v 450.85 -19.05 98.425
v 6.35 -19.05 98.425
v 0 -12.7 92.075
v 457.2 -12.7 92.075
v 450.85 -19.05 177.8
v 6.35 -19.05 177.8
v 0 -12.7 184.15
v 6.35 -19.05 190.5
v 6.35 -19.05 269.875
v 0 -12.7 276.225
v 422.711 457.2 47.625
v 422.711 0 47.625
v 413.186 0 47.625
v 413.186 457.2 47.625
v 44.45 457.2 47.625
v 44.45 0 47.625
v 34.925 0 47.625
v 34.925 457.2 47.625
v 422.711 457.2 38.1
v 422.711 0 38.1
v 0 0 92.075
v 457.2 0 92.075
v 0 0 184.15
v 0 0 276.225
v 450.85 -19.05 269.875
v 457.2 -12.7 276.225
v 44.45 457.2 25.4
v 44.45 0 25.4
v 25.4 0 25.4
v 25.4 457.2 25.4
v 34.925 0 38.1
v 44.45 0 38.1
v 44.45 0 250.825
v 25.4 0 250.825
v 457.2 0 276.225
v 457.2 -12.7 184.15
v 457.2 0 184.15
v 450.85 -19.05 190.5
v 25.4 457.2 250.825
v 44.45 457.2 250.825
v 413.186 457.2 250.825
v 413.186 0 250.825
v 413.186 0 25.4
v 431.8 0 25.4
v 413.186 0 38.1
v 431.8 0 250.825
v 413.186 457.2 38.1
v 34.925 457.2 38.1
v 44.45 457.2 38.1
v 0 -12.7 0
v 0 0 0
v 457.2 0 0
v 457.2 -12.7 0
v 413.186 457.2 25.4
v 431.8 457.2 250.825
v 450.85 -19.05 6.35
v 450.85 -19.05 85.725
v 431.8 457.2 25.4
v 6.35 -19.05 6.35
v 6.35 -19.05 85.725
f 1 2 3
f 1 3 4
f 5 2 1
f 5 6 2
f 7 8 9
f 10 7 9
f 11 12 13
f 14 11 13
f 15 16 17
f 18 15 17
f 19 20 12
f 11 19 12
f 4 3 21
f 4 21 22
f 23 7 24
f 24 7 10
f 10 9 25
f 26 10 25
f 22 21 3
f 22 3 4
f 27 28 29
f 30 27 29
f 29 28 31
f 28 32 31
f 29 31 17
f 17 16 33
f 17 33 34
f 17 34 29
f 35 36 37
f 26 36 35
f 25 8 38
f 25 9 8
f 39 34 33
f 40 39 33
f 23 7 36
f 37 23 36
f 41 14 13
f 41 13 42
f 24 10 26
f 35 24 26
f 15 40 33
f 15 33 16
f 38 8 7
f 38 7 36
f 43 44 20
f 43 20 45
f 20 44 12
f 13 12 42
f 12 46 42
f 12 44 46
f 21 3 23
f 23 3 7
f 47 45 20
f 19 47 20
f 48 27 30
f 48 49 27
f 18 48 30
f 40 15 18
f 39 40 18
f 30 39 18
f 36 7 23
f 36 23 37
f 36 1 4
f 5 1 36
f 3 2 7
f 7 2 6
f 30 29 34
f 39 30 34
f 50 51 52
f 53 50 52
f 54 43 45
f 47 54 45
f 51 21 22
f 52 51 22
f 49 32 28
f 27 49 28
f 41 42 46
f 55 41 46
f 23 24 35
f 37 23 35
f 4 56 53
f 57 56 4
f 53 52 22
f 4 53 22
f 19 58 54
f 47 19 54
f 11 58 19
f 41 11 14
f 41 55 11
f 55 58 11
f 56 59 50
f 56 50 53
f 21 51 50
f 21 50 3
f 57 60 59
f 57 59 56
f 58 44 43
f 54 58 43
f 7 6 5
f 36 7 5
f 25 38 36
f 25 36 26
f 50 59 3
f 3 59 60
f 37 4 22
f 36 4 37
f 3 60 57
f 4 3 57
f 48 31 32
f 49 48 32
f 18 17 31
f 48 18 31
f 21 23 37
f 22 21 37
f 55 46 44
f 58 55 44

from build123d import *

# Parameters (mm, degrees)
F0_W      = 457.2
F0_H      = 92.075
F1_DEPTH  = 19.05
F2_W      = 457.2
F2_H      = 92.075
F3_DEPTH  = 19.05
F4_W      = 457.2
F4_H      = 92.075
F5_DEPTH  = 19.05
F6_SIZE   = 6.35
F7_SIZE   = 6.35
F8_SIZE   = 6.35
F10_DEPTH = 457.2


with BuildPart() as f1:
    # F0 (on Front) → F1 (new body)
    with BuildSketch(Plane.XZ):
        with Locations((228.6, 46.0375)):
            Rectangle(F0_W, F0_H)
    extrude(amount=F1_DEPTH)

    # F6
    f6_edges = [f1.edges().sort_by_distance(p)[0] for p in [
        (228.6, -19.05, 92.075),
        (228.6, -19.05, 0),
        (457.2, -19.05, 46.0375),
        (0, -19.05, 46.0375),
    ]]
    chamfer(f6_edges, length=F6_SIZE)


with BuildPart() as f3:
    # F2 (on face) → F3 (new body)
    with BuildSketch(Plane.XZ.offset(19.05)):
        with Locations((228.6, 138.1125)):
            Rectangle(F2_W, F2_H)
    extrude(amount=-F3_DEPTH)

    # F7
    f7_edges = [f3.edges().sort_by_distance(p)[0] for p in [
        (228.6, -19.05, 92.075),
        (228.6, -19.05, 184.15),
        (457.2, -19.05, 138.1125),
        (0, -19.05, 138.1125),
    ]]
    chamfer(f7_edges, length=F7_SIZE)


with BuildPart() as f5:
    # F4 (on face) → F5 (new body)
    with BuildSketch(Plane.XZ.offset(19.05)):
        with Locations((228.6, 230.1875)):
            Rectangle(F4_W, F4_H)
    extrude(amount=-F5_DEPTH)

    # F8
    f8_edges = [f5.edges().sort_by_distance(p)[0] for p in [
        (228.6, -19.05, 184.15),
        (0, -19.05, 230.1875),
        (228.6, -19.05, 276.225),
        (457.2, -19.05, 230.1875),
    ]]
    chamfer(f8_edges, length=F8_SIZE)


with BuildPart() as f10:
    # F9 (on face) → F10 (new body)
    with BuildSketch(Plane(origin=(0, 0, 0), x_dir=(-1, 0, 0), z_dir=(0, 1, 0))):
        Polygon((-431.8, 250.825), (-431.8, 25.4), (-413.185925, 25.4), (-413.185925, 38.1), (-422.710925, 38.1), (-422.710925, 47.625), (-413.185925, 47.625), (-413.185925, 250.825), align=None)
        Polygon((-44.45, 25.4), (-25.4, 25.4), (-25.4, 250.825), (-44.45, 250.825), (-44.45, 47.625), (-34.925, 47.625), (-34.925, 38.1), (-44.45, 38.1), align=None)
    extrude(amount=F10_DEPTH)


solid = Compound([f1.part, f3.part, f5.part, f10.part])
